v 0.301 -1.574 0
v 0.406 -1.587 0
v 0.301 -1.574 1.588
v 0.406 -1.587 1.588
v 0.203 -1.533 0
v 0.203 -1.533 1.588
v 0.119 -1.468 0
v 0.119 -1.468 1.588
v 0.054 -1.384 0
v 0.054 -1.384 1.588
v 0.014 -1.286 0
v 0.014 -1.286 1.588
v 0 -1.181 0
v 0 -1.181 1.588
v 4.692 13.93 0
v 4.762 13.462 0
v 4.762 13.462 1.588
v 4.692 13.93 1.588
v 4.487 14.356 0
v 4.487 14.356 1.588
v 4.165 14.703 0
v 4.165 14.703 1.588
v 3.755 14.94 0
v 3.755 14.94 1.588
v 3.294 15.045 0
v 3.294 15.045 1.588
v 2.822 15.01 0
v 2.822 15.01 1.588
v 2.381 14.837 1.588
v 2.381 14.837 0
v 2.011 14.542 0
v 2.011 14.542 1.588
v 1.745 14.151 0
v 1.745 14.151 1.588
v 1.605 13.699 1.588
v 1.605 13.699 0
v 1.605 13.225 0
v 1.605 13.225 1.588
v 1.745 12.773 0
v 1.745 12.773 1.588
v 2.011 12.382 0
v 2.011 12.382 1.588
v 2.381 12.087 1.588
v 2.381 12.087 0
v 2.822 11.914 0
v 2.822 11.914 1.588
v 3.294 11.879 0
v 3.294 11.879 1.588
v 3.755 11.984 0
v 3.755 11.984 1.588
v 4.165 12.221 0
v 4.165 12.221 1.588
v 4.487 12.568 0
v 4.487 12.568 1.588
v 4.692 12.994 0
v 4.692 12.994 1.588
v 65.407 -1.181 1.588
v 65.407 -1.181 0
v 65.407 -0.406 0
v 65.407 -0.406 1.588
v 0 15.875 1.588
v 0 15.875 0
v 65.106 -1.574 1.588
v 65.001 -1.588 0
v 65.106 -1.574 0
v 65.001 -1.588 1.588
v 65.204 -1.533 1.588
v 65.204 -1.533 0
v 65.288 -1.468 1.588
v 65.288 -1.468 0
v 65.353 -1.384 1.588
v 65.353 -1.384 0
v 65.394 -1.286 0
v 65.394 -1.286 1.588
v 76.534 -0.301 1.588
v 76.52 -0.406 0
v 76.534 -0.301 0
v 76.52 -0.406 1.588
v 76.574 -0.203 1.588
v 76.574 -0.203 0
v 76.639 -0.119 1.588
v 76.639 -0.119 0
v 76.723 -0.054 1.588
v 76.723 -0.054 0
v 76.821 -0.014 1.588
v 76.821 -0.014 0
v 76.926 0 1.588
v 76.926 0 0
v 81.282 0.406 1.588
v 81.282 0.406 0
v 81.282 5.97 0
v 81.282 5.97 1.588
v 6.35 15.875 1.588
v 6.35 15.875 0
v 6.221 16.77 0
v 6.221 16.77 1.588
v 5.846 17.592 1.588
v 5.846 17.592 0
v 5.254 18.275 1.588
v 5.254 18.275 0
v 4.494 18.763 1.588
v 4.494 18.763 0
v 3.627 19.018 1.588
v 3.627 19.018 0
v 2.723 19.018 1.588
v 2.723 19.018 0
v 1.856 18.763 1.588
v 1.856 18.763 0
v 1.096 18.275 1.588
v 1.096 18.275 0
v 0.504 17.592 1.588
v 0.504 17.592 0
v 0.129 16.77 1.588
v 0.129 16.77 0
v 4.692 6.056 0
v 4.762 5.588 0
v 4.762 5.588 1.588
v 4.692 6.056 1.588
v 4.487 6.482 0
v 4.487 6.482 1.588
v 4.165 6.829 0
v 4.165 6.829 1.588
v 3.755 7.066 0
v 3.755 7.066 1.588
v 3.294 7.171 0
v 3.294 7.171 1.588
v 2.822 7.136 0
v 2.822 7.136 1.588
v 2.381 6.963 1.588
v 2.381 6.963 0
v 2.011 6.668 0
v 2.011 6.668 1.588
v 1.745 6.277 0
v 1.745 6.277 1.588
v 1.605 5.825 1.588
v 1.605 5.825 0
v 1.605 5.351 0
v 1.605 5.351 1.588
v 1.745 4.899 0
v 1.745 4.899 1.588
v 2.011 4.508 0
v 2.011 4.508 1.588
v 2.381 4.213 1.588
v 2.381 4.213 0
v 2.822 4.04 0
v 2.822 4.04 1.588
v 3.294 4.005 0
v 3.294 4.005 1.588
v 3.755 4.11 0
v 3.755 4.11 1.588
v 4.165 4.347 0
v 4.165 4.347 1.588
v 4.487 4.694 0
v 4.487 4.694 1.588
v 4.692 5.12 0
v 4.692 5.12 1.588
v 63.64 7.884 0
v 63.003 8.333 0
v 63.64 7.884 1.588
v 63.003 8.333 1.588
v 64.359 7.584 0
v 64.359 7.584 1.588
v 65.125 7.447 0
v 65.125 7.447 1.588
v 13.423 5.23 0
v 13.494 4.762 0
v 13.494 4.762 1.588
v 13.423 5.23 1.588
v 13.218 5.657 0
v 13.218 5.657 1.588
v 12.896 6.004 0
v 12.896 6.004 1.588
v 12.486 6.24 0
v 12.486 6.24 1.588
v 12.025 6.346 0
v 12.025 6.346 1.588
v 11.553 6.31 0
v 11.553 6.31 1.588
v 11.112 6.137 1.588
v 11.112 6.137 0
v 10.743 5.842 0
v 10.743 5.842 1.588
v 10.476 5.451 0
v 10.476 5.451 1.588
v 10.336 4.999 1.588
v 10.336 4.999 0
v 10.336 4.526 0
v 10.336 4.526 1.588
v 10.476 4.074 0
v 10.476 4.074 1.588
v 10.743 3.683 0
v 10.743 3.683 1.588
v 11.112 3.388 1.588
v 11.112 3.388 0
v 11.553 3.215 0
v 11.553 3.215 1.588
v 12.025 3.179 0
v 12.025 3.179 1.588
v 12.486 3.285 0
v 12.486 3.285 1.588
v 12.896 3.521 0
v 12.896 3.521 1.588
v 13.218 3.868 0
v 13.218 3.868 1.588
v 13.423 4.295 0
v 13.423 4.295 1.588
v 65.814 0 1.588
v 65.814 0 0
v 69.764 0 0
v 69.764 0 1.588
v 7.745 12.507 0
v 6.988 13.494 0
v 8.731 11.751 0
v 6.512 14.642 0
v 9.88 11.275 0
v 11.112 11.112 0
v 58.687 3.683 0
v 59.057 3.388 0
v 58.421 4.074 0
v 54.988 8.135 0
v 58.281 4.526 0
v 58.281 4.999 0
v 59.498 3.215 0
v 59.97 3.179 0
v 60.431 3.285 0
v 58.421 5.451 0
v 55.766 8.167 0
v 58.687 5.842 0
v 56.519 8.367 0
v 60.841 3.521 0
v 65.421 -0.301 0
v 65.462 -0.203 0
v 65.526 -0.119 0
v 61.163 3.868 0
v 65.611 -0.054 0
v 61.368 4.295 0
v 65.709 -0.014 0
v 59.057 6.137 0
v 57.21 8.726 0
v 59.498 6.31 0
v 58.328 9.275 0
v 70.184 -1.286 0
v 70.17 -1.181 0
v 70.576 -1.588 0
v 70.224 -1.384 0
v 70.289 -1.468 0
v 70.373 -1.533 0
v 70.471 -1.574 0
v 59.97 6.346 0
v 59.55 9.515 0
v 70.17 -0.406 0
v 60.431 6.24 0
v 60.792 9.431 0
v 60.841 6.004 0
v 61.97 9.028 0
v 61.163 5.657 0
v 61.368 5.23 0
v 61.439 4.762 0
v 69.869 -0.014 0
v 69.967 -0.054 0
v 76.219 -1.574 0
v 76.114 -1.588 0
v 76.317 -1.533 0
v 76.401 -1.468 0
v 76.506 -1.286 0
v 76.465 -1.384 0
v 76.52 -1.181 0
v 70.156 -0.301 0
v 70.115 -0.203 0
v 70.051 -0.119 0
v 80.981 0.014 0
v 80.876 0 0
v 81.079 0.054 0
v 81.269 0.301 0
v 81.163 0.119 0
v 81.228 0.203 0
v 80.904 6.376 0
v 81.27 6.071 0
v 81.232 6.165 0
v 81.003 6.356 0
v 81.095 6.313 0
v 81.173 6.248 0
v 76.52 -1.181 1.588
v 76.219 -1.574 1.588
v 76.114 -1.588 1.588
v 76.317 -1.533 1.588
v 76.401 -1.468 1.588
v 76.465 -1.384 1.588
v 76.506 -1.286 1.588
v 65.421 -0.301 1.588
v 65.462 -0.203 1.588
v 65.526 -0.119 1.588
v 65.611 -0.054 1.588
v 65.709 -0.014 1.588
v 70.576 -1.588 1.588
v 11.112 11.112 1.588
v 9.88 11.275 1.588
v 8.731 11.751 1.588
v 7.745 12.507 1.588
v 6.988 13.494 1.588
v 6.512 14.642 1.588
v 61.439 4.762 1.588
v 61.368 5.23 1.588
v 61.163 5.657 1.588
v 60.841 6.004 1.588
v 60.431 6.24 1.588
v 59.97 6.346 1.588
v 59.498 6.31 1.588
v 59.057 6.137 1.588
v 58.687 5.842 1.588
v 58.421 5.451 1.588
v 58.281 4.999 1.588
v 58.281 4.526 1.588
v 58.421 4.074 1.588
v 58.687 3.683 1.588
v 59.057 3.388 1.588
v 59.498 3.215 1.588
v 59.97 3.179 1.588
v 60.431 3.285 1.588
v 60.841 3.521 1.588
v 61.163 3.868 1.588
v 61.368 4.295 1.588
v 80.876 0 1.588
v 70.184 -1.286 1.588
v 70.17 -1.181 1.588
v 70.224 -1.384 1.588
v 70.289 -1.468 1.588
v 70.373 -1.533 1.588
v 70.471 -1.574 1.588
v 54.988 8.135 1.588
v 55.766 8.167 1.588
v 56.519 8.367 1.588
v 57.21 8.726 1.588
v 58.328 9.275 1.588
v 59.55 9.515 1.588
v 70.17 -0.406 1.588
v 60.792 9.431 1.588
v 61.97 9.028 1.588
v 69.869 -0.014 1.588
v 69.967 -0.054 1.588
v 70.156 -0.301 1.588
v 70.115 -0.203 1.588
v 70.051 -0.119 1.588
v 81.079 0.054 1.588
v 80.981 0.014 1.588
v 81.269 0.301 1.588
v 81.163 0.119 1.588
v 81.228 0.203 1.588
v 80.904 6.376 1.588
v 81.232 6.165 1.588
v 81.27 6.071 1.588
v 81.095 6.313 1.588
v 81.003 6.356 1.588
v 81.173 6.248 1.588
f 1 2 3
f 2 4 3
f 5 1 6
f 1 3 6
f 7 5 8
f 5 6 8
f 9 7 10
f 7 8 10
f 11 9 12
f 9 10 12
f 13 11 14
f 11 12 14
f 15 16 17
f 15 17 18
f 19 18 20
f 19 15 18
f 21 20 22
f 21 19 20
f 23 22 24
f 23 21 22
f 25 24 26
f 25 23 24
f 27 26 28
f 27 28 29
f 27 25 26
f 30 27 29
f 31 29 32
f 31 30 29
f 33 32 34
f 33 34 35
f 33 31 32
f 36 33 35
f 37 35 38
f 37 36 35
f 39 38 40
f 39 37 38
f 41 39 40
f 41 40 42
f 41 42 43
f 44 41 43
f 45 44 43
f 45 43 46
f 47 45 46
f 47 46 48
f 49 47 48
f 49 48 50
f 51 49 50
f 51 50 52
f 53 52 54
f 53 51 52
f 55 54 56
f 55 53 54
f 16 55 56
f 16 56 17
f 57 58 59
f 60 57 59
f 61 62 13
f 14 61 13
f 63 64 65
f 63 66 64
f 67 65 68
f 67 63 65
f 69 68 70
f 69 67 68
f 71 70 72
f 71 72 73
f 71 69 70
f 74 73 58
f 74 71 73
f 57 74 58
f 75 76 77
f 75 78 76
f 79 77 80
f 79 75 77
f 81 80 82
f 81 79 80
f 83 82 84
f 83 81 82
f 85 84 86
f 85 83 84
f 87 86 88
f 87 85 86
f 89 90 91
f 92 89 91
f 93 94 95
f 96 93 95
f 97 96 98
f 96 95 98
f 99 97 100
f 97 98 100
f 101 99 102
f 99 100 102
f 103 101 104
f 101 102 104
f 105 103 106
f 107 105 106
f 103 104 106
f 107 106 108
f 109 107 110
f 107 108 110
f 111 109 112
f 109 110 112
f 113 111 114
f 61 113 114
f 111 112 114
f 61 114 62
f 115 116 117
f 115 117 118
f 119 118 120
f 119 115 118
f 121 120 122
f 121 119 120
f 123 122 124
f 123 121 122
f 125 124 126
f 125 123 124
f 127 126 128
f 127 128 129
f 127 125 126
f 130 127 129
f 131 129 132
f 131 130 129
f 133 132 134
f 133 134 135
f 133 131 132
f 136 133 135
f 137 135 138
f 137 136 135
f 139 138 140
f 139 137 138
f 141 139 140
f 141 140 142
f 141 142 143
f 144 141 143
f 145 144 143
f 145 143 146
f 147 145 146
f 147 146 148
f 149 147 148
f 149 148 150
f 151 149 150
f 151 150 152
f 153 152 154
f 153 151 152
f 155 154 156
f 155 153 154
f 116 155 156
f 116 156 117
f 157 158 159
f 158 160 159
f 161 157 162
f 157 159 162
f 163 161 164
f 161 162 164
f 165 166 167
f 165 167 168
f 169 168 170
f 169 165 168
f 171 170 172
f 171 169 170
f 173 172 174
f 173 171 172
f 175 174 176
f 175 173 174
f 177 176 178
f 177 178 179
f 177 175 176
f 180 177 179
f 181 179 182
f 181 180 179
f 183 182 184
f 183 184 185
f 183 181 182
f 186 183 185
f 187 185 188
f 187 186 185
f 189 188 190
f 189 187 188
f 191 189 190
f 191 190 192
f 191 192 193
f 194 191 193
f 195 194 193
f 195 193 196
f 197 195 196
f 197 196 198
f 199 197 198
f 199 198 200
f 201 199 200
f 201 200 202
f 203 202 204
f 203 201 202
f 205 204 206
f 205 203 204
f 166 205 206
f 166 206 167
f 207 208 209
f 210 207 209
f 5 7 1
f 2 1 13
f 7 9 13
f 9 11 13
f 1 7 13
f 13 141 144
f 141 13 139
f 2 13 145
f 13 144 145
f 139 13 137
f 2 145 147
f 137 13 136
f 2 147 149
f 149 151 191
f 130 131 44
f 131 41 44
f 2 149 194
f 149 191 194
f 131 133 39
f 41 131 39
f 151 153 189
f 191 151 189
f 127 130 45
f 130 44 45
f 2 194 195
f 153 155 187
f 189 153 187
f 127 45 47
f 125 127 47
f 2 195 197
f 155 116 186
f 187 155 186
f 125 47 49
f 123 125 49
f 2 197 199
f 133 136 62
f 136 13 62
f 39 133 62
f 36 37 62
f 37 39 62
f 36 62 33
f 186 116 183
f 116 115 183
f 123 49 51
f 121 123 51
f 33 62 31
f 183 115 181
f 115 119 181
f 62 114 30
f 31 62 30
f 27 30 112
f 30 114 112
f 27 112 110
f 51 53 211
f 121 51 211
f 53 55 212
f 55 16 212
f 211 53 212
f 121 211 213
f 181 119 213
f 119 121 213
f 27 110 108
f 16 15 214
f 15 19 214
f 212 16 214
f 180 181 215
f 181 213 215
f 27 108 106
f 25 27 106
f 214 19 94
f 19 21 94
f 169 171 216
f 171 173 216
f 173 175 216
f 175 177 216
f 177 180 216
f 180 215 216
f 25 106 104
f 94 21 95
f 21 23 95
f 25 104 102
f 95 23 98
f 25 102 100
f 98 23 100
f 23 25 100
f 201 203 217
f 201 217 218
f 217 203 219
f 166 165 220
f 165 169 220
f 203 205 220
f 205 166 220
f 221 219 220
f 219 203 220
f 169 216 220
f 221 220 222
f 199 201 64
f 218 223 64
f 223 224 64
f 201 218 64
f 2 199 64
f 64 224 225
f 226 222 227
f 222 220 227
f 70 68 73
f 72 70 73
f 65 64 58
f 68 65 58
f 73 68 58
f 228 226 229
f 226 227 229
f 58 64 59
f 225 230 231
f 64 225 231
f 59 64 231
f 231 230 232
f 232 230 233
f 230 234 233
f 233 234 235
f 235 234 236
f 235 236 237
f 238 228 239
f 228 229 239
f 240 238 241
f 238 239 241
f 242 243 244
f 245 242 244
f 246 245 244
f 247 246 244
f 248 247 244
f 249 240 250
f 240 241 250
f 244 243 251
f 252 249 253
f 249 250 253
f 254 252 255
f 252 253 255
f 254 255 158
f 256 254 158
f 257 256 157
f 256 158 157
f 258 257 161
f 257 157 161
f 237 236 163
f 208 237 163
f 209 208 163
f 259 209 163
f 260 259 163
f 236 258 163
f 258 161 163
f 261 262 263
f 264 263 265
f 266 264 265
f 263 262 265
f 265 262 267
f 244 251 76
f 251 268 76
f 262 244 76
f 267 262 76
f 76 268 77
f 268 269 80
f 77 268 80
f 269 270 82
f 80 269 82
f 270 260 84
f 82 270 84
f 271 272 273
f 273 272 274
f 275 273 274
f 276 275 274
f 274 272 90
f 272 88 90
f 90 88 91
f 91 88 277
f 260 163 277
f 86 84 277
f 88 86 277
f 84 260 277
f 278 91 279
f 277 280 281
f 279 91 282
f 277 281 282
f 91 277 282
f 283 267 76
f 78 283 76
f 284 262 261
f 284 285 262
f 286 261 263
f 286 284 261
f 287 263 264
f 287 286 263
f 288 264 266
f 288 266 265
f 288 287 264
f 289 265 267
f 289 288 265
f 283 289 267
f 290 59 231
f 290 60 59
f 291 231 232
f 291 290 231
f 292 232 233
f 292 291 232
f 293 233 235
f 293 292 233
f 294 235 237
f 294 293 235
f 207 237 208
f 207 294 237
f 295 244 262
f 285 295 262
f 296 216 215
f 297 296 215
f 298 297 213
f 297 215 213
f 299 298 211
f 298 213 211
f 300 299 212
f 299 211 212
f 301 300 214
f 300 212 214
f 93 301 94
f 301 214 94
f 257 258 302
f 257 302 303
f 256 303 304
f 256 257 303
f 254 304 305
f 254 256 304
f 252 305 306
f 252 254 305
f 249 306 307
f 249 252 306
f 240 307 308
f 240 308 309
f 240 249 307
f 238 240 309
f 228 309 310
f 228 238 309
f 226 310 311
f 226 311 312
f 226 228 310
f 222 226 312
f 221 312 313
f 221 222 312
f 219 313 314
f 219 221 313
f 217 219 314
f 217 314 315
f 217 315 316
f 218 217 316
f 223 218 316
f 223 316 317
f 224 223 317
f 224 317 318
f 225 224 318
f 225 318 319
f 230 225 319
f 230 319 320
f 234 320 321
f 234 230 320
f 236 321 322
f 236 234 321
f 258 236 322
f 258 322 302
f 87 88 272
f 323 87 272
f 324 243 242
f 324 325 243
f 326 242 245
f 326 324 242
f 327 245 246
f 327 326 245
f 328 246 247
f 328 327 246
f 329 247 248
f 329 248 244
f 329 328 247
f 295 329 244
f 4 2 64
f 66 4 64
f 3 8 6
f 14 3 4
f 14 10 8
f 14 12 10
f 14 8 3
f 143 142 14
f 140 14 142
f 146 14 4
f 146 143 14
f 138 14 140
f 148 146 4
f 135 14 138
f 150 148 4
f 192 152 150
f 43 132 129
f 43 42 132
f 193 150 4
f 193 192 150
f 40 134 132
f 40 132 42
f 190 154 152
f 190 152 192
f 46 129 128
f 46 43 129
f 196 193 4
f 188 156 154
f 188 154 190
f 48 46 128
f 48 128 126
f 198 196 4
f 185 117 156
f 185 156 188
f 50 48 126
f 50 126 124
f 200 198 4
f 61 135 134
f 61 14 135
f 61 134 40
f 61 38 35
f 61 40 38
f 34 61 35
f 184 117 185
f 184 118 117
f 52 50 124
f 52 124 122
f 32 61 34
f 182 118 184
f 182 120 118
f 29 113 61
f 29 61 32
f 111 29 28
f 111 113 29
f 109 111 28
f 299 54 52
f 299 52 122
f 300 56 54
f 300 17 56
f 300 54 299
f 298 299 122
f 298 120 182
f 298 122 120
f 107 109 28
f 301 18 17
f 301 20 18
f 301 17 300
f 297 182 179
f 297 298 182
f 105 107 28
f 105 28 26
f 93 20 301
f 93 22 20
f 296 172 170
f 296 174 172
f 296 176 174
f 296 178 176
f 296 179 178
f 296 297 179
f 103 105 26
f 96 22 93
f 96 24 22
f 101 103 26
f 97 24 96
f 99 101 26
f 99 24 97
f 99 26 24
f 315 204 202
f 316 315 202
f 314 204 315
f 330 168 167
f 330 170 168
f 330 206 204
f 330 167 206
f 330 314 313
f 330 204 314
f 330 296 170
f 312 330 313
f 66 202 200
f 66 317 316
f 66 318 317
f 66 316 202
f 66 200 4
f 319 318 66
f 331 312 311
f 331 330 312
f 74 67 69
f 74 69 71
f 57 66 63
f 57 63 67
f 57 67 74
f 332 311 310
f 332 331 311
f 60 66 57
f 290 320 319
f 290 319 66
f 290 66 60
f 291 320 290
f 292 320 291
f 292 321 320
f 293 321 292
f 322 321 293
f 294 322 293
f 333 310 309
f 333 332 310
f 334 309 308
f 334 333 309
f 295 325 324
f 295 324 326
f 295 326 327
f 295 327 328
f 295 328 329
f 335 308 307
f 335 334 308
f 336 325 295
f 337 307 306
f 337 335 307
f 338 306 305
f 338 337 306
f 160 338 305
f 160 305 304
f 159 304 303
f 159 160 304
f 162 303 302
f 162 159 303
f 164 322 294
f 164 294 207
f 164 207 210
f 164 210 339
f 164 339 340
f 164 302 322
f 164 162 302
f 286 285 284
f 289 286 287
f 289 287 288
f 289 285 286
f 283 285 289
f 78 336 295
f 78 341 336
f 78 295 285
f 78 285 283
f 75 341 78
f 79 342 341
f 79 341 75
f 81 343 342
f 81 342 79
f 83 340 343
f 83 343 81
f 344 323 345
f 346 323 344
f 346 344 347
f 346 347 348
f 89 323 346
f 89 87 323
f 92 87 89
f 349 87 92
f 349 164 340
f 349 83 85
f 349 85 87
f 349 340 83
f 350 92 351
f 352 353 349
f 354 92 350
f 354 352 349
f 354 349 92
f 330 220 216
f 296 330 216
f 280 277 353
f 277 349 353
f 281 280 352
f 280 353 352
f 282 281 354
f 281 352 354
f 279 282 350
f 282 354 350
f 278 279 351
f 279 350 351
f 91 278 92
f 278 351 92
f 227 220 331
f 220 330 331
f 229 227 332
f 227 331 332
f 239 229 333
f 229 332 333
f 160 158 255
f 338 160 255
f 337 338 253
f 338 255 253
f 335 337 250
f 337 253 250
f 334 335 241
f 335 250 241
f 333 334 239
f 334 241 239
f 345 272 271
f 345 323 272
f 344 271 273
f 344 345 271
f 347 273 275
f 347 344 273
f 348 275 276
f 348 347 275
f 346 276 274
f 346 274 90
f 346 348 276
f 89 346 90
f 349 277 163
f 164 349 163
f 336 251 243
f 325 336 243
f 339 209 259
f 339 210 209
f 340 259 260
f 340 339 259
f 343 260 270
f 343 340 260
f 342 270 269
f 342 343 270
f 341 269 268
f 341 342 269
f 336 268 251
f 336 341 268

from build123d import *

# Parameters (mm, degrees)
SKETCH1_R           = 1.5875
BOSS_EXTRUDE1_DEPTH = 1.5875
FILLET1_R           = 0.4064
FILLET2_R           = 3.571875


with BuildPart() as part:
    # Sketch1 → Boss-Extrude1 (new body)
    with BuildSketch(Plane.XY):
        with BuildLine():
            Line((0, -1.5875), (65.4074384, -1.5875))
            Line((65.4074384, -1.5875), (65.4074384, 0))
            Line((65.4074384, 0), (70.1699384, 0))
            Line((70.1699384, 0), (70.1699384, -1.5875))
            Line((70.1699384, -1.5875), (76.5199384, -1.5875))
            Line((76.5199384, -1.5875), (76.5199384, 0))
            Line((76.5199384, 0), (81.2824384, 0))
            Line((81.2824384, 0), (81.2824384, 6.35))
            Line((81.2824384, 6.35), (63.718396184, 7.542088136))
            ThreePointArc((63.718396184, 7.542088136), (60.17368185, 9.514068607), (56.395022028, 8.039132457))
            Line((56.395022028, 8.039132457), (11.1125, 11.1125))
            ThreePointArc((11.1125, 11.1125), (7.744903955, 12.507403955), (6.35, 15.875))
            ThreePointArc((6.35, 15.875), (3.175, 19.05), (0, 15.875))
            Line((0, 15.875), (0, -1.5875))
        make_face()
        with Locations((3.175, 5.588)):
            Circle(SKETCH1_R, mode=Mode.SUBTRACT)
        with Locations((3.175, 13.462)):
            Circle(SKETCH1_R, mode=Mode.SUBTRACT)
        with Locations((11.90625, 4.7625)):
            Circle(SKETCH1_R, mode=Mode.SUBTRACT)
        with Locations((59.8511884, 4.7625)):
            Circle(SKETCH1_R, mode=Mode.SUBTRACT)
    extrude(amount=BOSS_EXTRUDE1_DEPTH)

    # Fillet1
    fillet1_edges = [part.edges().sort_by_distance(p)[0] for p in [
        (81.2824384, 6.35, 0.79375),
        (81.2824384, 0, 0.79375),
        (76.5199384, 0, 0.79375),
        (76.5199384, -1.5875, 0.79375),
        (70.1699384, -1.5875, 0.79375),
        (70.1699384, 0, 0.79375),
        (65.4074384, 0, 0.79375),
        (65.4074384, -1.5875, 0.79375),
        (0, -1.5875, 0.79375),
    ]]
    fillet(fillet1_edges, radius=FILLET1_R)

    # Fillet2
    fillet2_edges = [part.edges().sort_by_distance(p)[0] for p in [
        (56.395022028, 8.039132457, 0.79375),
        (63.718396184, 7.542088136, 0.79375),
    ]]
    fillet(fillet2_edges, radius=FILLET2_R)


solid = part.part
